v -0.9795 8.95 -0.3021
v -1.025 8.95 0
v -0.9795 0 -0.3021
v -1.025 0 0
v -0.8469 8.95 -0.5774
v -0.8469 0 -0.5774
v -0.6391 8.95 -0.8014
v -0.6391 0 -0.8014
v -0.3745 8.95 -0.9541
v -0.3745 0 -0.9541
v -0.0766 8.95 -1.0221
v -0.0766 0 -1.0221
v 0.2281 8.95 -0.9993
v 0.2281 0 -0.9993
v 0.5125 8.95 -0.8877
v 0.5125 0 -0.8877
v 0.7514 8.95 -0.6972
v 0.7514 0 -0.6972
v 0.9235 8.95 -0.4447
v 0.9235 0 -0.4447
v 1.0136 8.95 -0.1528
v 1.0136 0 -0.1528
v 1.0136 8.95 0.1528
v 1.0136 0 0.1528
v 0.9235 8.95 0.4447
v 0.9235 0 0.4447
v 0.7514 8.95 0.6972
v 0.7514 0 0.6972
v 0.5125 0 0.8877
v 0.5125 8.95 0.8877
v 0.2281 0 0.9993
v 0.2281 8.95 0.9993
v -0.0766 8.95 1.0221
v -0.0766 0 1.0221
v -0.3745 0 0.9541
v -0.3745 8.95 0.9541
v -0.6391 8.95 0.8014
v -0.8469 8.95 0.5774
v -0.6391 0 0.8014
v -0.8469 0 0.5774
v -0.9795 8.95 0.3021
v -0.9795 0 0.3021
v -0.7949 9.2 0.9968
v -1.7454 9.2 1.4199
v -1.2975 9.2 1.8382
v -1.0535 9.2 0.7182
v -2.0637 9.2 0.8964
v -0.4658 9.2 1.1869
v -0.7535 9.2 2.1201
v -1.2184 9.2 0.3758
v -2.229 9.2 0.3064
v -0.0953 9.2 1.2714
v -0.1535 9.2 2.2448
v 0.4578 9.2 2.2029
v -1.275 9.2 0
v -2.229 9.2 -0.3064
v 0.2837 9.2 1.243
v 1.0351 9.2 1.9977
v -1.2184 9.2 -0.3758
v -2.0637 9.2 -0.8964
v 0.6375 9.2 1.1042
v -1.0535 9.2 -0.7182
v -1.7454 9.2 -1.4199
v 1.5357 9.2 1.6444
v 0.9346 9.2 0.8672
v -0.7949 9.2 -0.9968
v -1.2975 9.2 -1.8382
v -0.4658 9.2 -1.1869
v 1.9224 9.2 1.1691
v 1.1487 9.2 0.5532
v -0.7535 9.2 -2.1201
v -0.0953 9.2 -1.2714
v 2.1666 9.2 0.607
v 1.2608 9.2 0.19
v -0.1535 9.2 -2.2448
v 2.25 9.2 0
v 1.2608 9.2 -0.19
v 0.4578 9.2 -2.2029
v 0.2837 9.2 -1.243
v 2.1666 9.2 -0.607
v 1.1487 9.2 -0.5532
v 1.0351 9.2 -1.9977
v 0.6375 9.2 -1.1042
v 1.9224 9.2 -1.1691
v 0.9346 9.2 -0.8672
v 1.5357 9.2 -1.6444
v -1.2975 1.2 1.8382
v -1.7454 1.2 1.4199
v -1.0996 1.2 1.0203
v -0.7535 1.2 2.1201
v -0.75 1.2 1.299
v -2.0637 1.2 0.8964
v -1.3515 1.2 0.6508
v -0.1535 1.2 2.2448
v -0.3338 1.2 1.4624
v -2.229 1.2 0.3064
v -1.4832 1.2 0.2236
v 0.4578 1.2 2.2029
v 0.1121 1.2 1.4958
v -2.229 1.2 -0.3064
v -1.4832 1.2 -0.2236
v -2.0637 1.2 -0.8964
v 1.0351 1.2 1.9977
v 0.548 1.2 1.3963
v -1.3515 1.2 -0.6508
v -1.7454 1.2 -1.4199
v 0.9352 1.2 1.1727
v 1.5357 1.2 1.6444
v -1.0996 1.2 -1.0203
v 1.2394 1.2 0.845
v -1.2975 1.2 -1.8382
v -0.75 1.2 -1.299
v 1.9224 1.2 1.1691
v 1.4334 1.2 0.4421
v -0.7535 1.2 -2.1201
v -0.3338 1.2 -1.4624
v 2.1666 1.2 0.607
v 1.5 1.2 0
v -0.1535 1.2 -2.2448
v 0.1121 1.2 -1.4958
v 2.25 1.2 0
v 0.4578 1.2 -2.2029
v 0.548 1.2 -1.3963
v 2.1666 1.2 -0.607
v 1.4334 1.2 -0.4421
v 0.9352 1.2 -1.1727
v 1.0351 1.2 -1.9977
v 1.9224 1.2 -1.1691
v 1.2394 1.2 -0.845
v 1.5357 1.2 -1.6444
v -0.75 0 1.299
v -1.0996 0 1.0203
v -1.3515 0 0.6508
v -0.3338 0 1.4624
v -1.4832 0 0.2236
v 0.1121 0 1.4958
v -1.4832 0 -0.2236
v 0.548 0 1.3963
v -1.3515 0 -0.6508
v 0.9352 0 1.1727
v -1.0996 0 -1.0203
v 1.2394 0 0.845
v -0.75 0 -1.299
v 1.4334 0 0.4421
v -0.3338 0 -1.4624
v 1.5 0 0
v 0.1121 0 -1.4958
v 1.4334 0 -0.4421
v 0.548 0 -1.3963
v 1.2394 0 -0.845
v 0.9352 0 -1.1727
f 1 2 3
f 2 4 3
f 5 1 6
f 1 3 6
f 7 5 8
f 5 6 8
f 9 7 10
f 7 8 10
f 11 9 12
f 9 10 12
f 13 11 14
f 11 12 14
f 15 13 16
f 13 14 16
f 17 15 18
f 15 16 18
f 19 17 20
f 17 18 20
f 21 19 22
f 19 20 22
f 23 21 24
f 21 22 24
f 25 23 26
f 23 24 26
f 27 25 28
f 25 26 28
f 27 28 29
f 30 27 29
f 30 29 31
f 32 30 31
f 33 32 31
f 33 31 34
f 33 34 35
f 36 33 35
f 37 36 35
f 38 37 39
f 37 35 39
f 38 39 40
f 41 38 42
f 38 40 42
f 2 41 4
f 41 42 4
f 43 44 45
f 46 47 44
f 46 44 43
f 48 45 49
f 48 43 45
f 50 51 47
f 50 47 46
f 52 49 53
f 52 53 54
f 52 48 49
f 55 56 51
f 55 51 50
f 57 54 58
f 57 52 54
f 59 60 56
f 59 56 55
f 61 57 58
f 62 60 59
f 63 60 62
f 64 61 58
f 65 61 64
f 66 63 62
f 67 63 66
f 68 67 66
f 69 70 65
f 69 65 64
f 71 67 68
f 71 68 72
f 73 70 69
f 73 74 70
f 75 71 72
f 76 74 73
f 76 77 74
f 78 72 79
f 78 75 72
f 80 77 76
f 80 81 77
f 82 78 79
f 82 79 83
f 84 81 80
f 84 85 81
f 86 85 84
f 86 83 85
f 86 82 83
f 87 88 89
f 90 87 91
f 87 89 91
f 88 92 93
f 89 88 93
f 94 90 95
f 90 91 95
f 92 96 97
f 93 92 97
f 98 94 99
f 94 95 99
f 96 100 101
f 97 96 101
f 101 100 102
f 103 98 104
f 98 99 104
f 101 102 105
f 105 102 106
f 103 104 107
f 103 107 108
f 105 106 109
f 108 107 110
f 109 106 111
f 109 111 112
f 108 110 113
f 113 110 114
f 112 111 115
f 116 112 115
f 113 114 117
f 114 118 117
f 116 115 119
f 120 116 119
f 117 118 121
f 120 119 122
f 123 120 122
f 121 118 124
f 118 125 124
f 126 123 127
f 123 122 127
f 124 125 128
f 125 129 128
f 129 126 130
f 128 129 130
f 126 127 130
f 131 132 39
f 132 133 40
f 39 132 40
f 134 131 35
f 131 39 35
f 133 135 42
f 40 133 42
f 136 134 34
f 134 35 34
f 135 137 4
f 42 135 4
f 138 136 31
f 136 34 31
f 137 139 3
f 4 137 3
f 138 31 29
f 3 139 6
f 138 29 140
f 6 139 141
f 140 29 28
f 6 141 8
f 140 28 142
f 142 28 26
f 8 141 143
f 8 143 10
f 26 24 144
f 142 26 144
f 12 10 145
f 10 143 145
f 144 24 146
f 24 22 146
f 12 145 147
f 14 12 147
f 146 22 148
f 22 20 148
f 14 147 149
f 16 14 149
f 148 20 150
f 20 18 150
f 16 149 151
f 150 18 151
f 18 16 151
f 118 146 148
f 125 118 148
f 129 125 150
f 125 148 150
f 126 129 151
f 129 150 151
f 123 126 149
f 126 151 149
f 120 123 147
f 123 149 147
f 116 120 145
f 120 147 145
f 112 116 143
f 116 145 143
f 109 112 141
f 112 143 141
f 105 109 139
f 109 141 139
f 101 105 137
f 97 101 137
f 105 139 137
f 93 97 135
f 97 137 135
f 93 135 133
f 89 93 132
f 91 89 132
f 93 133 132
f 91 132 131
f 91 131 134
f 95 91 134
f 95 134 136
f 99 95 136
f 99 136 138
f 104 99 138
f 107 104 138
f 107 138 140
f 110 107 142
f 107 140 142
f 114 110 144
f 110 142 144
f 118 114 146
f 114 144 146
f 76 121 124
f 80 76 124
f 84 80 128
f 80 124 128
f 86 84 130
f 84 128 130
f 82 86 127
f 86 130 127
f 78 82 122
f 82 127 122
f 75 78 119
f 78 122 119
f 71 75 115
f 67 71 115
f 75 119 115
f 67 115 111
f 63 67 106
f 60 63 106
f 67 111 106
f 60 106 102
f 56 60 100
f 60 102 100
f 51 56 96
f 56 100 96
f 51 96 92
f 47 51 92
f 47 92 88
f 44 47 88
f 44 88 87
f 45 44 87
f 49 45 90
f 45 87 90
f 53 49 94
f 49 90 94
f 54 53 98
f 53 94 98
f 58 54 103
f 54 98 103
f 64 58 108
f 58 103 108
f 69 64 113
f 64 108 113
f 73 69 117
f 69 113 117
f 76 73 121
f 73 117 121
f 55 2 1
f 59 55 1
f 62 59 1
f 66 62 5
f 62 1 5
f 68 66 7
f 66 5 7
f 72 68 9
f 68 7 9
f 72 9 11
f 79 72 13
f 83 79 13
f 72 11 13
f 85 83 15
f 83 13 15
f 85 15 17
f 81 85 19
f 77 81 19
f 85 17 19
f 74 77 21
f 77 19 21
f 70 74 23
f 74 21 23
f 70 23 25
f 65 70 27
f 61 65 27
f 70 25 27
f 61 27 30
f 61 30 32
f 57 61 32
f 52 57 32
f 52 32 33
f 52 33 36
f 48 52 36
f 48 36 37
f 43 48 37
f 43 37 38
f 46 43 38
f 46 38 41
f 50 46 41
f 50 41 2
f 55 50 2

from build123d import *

# Parameters (mm, degrees)
SKETCH_1_R                     = 1.5
EXTRUDE_1_DEPTH                = 1.2
SKETCH_2_R                     = 2.25
EXTRUDE_2_DEPTH                = 8
HOLE_WIZARD_M2_5_1_D           = 2.05
HOLE_WIZARD_M2_5_1_CSINK_D     = 2.55
HOLE_WIZARD_M2_5_1_CSINK_ANGLE = 90


with BuildPart() as part:
    # 草图1 → 凸台-拉伸1 (new body)
    with BuildSketch(Plane(origin=(0, 0, 0), x_dir=(1, 0, 0), z_dir=(0, 1, 0))):
        Circle(SKETCH_1_R)
    extrude(amount=EXTRUDE_1_DEPTH)

    # 草图2 → 凸台-拉伸2 (add)
    with BuildSketch(Plane(origin=(0, 1.2, 0), x_dir=(1, 0, 0), z_dir=(0, 1, 0))):
        Circle(SKETCH_2_R)
    extrude(amount=EXTRUDE_2_DEPTH)

    # M2.5 螺纹孔1 (through all)
    with Locations(Plane(origin=(0, 9.2, 0), x_dir=(1, 0, 0), z_dir=(0, 1, 0))):
        with Locations((0, 0)):
            CounterSinkHole(HOLE_WIZARD_M2_5_1_D / 2, HOLE_WIZARD_M2_5_1_CSINK_D / 2, counter_sink_angle=HOLE_WIZARD_M2_5_1_CSINK_ANGLE)


solid = part.part
